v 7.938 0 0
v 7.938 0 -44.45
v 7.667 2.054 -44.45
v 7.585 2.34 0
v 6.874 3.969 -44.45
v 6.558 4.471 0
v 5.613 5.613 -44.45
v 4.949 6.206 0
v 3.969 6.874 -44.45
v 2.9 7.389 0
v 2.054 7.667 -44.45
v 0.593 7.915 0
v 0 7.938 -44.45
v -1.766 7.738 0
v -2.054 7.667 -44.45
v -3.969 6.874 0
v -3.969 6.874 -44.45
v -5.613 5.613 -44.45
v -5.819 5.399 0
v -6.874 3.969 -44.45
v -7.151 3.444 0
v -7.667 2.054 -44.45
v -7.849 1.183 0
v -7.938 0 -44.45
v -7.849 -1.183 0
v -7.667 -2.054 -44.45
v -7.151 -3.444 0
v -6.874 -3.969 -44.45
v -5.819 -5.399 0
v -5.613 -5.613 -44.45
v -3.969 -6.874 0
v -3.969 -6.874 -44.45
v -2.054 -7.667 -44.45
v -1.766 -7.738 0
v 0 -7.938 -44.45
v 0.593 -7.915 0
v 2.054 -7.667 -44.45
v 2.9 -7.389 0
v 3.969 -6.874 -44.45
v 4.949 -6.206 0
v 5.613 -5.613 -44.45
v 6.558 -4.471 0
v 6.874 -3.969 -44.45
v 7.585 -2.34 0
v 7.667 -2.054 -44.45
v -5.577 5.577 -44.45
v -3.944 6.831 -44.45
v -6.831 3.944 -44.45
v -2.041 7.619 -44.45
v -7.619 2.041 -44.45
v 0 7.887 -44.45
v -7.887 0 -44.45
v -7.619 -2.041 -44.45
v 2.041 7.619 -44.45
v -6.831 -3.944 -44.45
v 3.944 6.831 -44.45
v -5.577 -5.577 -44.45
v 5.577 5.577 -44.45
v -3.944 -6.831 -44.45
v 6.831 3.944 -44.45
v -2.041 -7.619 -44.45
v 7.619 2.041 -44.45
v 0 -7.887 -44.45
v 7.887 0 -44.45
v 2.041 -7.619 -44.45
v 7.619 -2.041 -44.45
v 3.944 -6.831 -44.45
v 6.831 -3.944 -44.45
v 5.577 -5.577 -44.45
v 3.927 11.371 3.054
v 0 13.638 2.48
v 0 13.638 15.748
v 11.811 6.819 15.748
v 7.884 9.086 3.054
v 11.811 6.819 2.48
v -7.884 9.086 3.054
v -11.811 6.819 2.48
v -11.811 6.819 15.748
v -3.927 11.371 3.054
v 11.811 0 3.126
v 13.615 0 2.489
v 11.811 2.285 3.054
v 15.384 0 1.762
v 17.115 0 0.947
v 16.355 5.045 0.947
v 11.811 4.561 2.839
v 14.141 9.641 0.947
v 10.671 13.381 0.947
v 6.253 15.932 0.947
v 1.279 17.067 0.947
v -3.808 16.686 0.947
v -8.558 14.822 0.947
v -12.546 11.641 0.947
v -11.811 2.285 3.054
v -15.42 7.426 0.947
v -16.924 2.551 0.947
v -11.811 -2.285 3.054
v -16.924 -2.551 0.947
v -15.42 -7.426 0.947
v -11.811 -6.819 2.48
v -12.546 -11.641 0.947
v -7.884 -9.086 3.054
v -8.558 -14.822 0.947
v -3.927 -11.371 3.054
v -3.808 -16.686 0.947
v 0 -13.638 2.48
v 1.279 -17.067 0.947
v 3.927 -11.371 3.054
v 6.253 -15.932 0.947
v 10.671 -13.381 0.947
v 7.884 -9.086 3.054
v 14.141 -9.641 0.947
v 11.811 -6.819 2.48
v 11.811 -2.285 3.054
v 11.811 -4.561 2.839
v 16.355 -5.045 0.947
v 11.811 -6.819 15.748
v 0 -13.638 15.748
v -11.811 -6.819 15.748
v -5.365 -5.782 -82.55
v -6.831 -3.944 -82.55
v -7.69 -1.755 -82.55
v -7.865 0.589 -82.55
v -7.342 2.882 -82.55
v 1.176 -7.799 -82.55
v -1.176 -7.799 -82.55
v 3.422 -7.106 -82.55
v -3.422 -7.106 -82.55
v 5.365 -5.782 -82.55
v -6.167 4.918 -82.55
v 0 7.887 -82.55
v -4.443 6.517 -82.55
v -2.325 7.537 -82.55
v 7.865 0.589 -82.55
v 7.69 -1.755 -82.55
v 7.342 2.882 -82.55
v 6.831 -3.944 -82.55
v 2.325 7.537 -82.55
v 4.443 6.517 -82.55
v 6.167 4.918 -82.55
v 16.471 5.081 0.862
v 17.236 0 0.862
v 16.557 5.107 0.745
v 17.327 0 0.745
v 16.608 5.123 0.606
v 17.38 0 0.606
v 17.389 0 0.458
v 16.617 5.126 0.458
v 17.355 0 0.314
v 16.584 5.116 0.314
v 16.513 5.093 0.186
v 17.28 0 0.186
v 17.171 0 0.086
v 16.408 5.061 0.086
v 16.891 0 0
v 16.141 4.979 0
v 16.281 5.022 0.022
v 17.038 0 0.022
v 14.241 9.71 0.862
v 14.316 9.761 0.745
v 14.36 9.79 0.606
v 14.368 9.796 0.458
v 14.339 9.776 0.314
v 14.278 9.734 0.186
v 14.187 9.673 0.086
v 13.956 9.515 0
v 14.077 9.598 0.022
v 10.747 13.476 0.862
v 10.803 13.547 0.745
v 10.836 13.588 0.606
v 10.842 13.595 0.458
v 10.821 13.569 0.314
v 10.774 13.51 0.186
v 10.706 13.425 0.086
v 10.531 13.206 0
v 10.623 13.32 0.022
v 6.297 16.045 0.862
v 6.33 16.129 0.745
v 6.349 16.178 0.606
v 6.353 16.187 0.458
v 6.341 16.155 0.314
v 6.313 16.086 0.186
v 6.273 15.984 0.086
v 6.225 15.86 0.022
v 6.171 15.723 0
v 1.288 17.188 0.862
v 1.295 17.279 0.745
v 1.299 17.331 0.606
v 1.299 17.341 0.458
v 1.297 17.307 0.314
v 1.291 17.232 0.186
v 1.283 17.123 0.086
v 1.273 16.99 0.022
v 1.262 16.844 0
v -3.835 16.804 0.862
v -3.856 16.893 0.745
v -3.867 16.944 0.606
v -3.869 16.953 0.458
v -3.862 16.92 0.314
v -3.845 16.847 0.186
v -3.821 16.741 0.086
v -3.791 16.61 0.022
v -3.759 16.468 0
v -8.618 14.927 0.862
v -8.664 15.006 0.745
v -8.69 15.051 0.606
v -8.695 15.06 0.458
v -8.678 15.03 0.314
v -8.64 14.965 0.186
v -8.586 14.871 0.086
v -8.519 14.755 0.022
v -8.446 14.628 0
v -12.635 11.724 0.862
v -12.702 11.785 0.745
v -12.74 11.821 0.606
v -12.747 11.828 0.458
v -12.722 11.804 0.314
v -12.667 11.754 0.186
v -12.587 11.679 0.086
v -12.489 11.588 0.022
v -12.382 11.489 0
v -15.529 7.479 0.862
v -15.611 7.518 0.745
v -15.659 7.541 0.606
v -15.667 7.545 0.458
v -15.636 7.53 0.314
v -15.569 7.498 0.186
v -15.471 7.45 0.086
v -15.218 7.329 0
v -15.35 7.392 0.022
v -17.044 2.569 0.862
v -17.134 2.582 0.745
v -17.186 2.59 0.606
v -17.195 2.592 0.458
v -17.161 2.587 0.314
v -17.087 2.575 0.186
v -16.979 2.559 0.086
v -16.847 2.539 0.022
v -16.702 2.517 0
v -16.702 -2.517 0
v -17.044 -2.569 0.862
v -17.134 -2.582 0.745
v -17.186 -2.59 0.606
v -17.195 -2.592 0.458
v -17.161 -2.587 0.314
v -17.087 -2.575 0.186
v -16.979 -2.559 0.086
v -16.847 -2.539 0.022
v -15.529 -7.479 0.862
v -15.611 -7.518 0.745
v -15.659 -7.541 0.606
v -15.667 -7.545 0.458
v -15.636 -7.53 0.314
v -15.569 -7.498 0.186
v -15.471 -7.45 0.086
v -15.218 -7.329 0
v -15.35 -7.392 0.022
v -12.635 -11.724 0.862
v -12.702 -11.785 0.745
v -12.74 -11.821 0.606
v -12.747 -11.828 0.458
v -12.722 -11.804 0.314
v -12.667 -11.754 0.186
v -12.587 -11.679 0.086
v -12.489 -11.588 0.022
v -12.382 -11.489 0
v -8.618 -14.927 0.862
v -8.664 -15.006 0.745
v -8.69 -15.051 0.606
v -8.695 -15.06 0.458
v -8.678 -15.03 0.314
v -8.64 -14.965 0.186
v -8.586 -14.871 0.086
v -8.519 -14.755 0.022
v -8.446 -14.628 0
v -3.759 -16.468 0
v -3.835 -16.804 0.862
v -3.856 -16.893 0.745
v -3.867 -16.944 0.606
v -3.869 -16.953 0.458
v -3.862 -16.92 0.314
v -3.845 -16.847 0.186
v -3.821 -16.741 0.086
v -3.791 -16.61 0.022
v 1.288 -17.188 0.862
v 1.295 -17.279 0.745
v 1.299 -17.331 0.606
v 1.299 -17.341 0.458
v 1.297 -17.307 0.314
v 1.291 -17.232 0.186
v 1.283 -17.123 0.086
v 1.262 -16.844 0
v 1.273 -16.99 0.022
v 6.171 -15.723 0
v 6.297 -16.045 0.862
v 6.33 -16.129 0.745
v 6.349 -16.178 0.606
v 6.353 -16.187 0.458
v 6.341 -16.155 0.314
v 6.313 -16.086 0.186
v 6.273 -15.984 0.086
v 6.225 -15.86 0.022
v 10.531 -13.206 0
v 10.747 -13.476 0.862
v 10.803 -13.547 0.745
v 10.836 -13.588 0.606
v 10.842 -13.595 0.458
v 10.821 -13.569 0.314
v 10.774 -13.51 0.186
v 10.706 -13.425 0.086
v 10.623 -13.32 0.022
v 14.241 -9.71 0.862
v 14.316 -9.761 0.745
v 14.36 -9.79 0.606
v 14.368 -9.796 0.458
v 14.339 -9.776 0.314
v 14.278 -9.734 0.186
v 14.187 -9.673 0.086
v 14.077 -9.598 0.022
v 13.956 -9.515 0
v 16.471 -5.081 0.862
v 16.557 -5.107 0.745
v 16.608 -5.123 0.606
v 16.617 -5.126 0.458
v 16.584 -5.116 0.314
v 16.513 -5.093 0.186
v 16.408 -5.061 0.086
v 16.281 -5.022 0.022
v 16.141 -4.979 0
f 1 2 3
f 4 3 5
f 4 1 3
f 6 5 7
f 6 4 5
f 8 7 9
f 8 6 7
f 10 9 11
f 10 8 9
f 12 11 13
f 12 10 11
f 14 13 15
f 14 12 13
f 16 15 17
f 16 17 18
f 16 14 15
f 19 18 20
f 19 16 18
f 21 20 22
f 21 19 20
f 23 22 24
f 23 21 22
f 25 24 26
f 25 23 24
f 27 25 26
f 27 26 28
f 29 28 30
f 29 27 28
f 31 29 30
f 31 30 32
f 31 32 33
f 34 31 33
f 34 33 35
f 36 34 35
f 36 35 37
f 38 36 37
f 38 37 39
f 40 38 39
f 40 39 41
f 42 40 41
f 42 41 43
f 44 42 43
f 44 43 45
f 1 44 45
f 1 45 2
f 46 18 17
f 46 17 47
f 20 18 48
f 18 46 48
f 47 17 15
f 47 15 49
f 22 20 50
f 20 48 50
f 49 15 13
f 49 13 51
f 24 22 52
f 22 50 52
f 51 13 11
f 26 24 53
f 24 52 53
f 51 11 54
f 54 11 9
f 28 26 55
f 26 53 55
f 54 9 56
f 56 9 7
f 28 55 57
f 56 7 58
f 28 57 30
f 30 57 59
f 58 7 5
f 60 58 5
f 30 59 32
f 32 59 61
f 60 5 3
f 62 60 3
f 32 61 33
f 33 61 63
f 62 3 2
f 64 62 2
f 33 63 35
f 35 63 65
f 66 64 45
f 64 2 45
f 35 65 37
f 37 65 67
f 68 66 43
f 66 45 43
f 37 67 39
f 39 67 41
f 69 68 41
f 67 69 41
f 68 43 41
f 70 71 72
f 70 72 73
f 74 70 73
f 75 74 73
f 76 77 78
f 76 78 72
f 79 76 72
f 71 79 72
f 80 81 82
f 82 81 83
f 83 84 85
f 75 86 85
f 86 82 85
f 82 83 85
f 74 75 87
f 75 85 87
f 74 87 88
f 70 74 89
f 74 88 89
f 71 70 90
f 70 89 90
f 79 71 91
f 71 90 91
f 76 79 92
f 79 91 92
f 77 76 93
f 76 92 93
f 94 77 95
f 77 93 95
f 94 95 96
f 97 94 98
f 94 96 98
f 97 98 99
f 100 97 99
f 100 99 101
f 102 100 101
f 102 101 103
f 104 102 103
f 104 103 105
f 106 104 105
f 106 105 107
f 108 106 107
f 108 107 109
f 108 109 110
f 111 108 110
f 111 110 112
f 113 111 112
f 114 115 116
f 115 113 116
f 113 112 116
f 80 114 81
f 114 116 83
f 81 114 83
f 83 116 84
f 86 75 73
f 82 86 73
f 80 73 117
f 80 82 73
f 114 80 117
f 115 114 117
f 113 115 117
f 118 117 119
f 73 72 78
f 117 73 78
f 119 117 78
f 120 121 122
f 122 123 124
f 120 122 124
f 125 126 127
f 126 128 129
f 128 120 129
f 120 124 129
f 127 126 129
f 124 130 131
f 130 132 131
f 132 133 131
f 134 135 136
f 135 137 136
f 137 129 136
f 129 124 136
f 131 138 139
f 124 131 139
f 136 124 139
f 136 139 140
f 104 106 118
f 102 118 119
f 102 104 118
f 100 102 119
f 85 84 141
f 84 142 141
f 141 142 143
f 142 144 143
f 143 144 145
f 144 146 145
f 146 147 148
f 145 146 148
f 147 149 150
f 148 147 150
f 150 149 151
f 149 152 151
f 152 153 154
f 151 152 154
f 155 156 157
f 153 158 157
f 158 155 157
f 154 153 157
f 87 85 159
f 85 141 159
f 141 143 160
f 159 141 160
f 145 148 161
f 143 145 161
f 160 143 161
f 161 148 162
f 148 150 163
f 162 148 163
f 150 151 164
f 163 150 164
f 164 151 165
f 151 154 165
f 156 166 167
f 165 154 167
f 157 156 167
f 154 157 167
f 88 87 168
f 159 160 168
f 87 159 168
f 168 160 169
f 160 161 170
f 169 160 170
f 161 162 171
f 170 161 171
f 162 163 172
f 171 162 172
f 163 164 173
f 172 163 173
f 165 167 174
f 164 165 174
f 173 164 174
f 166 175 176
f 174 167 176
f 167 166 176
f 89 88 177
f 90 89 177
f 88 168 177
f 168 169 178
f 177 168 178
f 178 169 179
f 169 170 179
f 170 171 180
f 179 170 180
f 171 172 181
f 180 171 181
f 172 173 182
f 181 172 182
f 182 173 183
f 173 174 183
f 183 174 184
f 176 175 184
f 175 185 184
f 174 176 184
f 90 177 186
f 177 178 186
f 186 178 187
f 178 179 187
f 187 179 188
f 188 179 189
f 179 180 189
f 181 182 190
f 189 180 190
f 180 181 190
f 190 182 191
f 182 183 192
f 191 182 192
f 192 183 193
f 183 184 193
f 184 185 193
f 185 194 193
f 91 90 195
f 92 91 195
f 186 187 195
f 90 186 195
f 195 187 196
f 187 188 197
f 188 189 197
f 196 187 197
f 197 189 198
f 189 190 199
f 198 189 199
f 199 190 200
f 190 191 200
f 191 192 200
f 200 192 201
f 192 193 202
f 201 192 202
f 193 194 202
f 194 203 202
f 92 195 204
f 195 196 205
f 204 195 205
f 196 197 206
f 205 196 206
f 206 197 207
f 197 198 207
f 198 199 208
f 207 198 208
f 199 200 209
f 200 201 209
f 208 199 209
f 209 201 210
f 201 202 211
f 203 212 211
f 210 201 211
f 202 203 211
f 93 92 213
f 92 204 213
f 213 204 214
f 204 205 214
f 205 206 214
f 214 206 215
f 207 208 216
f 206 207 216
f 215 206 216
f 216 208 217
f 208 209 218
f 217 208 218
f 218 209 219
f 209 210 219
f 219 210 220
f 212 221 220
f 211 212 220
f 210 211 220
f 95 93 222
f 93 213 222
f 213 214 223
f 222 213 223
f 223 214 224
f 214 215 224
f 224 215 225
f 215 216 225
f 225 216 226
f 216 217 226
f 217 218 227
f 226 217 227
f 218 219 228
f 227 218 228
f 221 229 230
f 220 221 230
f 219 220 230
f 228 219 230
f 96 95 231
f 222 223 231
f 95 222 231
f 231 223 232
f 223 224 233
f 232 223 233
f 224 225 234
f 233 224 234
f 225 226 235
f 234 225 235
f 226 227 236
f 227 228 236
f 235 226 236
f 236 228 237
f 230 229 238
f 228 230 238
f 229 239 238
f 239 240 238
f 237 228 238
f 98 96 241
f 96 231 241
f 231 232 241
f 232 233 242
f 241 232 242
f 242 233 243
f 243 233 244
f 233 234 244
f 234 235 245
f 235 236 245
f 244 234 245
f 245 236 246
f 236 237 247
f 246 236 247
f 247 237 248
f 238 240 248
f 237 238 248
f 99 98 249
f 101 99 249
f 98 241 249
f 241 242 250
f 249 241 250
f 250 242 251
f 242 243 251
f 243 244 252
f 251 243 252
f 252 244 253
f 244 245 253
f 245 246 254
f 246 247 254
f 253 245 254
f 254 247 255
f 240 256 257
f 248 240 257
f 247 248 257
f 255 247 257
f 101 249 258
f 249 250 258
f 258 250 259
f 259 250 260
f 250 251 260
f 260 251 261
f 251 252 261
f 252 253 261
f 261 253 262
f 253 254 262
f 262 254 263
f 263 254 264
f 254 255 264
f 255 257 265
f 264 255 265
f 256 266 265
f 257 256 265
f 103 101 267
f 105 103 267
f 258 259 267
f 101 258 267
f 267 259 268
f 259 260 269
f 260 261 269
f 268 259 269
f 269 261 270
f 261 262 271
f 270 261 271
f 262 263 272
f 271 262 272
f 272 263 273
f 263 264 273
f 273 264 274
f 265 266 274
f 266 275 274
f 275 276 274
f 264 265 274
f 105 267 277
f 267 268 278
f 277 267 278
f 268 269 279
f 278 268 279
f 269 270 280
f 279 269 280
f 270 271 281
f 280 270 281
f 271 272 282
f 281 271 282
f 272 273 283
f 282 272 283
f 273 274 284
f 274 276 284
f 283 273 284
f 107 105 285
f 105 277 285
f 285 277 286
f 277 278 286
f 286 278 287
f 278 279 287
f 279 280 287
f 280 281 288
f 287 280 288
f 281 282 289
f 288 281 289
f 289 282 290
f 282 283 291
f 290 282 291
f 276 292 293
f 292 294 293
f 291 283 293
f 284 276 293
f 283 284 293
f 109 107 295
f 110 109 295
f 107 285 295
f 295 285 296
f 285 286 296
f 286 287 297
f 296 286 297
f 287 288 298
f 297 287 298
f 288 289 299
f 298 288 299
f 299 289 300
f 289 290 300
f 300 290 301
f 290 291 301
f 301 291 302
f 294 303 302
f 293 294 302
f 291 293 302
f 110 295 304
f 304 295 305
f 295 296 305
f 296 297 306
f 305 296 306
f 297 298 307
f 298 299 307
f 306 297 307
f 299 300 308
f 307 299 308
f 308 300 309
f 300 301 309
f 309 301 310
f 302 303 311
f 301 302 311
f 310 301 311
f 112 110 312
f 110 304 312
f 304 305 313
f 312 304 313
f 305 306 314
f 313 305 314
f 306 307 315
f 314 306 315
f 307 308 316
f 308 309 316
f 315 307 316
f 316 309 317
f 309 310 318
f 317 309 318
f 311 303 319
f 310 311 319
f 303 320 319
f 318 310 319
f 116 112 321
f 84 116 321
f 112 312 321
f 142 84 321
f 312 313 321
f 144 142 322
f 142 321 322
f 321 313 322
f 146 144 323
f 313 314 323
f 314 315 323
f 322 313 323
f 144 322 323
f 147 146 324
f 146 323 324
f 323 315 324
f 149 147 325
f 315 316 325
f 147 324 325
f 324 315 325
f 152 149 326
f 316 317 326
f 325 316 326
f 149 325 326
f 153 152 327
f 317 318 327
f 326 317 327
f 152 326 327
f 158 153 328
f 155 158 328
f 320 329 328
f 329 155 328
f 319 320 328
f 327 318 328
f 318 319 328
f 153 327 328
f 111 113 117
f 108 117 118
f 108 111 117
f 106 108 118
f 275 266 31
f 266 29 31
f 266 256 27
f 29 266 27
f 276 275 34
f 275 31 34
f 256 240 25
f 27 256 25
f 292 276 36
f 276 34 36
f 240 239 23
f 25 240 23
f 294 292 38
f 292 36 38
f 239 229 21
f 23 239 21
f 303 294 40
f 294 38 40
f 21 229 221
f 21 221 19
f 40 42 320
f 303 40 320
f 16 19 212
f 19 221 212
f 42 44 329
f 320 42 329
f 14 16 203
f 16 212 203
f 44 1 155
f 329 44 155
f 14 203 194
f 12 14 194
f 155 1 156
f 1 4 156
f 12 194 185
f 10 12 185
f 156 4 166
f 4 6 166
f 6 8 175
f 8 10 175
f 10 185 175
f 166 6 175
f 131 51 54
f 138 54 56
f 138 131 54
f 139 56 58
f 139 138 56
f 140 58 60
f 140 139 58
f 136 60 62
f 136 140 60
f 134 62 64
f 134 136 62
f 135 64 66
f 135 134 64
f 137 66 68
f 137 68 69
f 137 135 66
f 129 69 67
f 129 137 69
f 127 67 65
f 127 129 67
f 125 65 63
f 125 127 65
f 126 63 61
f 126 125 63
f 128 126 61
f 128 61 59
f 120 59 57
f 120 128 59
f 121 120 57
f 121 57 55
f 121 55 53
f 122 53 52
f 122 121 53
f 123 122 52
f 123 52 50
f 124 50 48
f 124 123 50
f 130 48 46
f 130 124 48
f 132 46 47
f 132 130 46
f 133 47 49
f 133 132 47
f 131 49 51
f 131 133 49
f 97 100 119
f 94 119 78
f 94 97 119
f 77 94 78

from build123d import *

# Parameters (mm, degrees)
HEAD_DEPTH     = 15.748
SHANK_SKETCH_R = 7.9375
SHANK_DEPTH    = 82.55
THREAD_END_W   = 38.1
THREAD_END_H   = 0.05


with BuildPart() as part:
    # Head Sketch → Head (new body)
    with BuildSketch(Plane.XY):
        Polygon((0, 13.638168059), (11.811, 6.819084029), (11.811, -6.819084029), (0, -13.638168059), (-11.811, -6.819084029), (-11.811, 6.819084029), align=None)
    extrude(amount=HEAD_DEPTH)

    # Shank Sketch → Shank (add)
    with BuildSketch(Plane.XY):
        Circle(SHANK_SKETCH_R)
    extrude(amount=-SHANK_DEPTH)

    # Sketch3 → Flange (revolve)
    with BuildSketch(Plane(origin=(0, 0, 0), x_dir=(-1, 0, 0), z_dir=(0, 1, 0))):
        with BuildLine():
            Line((-16.891, 0), (0, 0))
            Line((0, 0), (0, 5))
            ThreePointArc((0, 5), (-8.794301894, 3.972903196), (-17.115237243, 0.946897817))
            ThreePointArc((-17.115237243, 0.946897817), (-17.377543373, 0.384780446), (-16.891, 0))
        make_face()
    revolve(axis=Axis((0, 0, 0), (0, 0, 1)))

    # Thread End → Thread Cut (revolve, cut)
    with BuildSketch(Plane(origin=(0, 0, 0), x_dir=(0, 0, -1), z_dir=(1, 0, 0))):
        with Locations((63.5, 7.9125)):
            Rectangle(THREAD_END_W, THREAD_END_H)
    revolve(axis=Axis((0, 0, -21.551935625), (0, 0, -1)), mode=Mode.SUBTRACT)


solid = part.part
